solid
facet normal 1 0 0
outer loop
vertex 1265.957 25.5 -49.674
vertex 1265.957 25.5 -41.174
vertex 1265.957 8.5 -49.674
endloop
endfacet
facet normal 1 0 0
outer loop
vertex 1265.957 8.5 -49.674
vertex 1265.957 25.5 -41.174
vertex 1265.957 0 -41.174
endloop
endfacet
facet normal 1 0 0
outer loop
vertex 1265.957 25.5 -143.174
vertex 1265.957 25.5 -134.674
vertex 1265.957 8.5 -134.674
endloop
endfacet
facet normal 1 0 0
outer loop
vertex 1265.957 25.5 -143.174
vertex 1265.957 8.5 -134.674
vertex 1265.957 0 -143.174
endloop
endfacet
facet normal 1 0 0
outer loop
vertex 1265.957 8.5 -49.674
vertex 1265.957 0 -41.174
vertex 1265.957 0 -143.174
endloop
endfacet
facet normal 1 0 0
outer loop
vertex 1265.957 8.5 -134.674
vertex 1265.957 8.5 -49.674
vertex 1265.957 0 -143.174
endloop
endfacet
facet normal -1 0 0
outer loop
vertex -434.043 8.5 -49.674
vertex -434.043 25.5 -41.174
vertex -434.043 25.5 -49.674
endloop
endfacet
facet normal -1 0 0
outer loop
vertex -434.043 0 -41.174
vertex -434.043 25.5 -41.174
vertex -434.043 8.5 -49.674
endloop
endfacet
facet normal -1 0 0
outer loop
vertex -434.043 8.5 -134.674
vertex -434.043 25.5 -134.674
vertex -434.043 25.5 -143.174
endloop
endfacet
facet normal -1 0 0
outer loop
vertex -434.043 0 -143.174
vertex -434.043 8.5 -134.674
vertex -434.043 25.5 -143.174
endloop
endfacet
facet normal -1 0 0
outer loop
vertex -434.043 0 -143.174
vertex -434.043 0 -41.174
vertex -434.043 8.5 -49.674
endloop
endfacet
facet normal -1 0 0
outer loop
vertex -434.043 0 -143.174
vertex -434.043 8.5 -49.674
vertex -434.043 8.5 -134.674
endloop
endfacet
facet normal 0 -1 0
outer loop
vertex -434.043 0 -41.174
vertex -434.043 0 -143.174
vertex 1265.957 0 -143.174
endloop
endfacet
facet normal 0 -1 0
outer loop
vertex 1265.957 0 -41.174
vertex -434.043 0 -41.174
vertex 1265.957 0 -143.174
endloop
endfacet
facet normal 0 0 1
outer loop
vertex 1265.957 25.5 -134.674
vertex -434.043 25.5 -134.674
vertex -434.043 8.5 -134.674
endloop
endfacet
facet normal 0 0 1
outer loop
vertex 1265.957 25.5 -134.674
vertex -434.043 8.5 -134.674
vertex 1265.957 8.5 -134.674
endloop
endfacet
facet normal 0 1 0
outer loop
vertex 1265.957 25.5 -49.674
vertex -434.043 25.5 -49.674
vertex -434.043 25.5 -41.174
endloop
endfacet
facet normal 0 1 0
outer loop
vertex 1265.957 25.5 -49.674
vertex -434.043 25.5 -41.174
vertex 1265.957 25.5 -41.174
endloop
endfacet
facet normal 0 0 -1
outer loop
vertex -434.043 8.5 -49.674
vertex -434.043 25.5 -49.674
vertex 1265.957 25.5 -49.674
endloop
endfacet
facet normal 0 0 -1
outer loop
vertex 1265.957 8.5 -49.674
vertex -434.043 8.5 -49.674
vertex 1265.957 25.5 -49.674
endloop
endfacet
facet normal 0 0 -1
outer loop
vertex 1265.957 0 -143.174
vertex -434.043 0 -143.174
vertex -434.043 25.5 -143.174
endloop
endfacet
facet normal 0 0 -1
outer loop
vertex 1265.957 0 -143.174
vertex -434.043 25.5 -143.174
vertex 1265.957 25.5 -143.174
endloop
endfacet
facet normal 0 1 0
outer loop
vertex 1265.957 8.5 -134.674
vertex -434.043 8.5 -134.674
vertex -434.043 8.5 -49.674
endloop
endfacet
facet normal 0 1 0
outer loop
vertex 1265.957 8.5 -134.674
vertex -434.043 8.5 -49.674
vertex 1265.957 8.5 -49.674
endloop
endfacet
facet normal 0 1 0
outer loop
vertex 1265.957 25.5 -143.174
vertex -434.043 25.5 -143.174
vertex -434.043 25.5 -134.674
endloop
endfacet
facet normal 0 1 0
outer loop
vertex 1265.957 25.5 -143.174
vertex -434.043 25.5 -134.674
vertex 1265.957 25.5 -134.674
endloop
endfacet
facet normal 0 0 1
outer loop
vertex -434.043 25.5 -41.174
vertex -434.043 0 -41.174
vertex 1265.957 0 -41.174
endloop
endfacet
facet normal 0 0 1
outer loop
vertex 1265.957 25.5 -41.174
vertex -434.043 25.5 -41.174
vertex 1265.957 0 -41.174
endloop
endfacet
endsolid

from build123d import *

# Parameters (mm, degrees)
SKETCH_1_W          = 1000
SKETCH_1_H          = 60
EXTRUDE_1_DEPTH     = 15
SKETCH_2_W          = 1000
SKETCH_2_H          = 50
CUT_EXTRUDE_1_DEPTH = 10
SCALE_1_SCALE       = 1.7


with BuildPart() as part:
    # 草图1 → 凸台-拉伸1 (new body)
    with BuildSketch(Plane(origin=(0, 0, 0), x_dir=(1, 0, 0), z_dir=(0, 1, 0))):
        with Locations((244.680851064, 54.219858156)):
            Rectangle(SKETCH_1_W, SKETCH_1_H)
    extrude(amount=EXTRUDE_1_DEPTH)

    # 草图2 → 切除-拉伸1 (cut)
    with BuildSketch(Plane(origin=(0, 15, 0), x_dir=(1, 0, 0), z_dir=(0, 1, 0))):
        with Locations((244.680851064, 54.219858156)):
            Rectangle(SKETCH_2_W, SKETCH_2_H)
    extrude(amount=-CUT_EXTRUDE_1_DEPTH, mode=Mode.SUBTRACT)


with BuildPart() as part_1:
    # 缩放比例1: scaled about (0, 0, 0)
    add(part.part.scale(SCALE_1_SCALE))


solid = part_1.part
